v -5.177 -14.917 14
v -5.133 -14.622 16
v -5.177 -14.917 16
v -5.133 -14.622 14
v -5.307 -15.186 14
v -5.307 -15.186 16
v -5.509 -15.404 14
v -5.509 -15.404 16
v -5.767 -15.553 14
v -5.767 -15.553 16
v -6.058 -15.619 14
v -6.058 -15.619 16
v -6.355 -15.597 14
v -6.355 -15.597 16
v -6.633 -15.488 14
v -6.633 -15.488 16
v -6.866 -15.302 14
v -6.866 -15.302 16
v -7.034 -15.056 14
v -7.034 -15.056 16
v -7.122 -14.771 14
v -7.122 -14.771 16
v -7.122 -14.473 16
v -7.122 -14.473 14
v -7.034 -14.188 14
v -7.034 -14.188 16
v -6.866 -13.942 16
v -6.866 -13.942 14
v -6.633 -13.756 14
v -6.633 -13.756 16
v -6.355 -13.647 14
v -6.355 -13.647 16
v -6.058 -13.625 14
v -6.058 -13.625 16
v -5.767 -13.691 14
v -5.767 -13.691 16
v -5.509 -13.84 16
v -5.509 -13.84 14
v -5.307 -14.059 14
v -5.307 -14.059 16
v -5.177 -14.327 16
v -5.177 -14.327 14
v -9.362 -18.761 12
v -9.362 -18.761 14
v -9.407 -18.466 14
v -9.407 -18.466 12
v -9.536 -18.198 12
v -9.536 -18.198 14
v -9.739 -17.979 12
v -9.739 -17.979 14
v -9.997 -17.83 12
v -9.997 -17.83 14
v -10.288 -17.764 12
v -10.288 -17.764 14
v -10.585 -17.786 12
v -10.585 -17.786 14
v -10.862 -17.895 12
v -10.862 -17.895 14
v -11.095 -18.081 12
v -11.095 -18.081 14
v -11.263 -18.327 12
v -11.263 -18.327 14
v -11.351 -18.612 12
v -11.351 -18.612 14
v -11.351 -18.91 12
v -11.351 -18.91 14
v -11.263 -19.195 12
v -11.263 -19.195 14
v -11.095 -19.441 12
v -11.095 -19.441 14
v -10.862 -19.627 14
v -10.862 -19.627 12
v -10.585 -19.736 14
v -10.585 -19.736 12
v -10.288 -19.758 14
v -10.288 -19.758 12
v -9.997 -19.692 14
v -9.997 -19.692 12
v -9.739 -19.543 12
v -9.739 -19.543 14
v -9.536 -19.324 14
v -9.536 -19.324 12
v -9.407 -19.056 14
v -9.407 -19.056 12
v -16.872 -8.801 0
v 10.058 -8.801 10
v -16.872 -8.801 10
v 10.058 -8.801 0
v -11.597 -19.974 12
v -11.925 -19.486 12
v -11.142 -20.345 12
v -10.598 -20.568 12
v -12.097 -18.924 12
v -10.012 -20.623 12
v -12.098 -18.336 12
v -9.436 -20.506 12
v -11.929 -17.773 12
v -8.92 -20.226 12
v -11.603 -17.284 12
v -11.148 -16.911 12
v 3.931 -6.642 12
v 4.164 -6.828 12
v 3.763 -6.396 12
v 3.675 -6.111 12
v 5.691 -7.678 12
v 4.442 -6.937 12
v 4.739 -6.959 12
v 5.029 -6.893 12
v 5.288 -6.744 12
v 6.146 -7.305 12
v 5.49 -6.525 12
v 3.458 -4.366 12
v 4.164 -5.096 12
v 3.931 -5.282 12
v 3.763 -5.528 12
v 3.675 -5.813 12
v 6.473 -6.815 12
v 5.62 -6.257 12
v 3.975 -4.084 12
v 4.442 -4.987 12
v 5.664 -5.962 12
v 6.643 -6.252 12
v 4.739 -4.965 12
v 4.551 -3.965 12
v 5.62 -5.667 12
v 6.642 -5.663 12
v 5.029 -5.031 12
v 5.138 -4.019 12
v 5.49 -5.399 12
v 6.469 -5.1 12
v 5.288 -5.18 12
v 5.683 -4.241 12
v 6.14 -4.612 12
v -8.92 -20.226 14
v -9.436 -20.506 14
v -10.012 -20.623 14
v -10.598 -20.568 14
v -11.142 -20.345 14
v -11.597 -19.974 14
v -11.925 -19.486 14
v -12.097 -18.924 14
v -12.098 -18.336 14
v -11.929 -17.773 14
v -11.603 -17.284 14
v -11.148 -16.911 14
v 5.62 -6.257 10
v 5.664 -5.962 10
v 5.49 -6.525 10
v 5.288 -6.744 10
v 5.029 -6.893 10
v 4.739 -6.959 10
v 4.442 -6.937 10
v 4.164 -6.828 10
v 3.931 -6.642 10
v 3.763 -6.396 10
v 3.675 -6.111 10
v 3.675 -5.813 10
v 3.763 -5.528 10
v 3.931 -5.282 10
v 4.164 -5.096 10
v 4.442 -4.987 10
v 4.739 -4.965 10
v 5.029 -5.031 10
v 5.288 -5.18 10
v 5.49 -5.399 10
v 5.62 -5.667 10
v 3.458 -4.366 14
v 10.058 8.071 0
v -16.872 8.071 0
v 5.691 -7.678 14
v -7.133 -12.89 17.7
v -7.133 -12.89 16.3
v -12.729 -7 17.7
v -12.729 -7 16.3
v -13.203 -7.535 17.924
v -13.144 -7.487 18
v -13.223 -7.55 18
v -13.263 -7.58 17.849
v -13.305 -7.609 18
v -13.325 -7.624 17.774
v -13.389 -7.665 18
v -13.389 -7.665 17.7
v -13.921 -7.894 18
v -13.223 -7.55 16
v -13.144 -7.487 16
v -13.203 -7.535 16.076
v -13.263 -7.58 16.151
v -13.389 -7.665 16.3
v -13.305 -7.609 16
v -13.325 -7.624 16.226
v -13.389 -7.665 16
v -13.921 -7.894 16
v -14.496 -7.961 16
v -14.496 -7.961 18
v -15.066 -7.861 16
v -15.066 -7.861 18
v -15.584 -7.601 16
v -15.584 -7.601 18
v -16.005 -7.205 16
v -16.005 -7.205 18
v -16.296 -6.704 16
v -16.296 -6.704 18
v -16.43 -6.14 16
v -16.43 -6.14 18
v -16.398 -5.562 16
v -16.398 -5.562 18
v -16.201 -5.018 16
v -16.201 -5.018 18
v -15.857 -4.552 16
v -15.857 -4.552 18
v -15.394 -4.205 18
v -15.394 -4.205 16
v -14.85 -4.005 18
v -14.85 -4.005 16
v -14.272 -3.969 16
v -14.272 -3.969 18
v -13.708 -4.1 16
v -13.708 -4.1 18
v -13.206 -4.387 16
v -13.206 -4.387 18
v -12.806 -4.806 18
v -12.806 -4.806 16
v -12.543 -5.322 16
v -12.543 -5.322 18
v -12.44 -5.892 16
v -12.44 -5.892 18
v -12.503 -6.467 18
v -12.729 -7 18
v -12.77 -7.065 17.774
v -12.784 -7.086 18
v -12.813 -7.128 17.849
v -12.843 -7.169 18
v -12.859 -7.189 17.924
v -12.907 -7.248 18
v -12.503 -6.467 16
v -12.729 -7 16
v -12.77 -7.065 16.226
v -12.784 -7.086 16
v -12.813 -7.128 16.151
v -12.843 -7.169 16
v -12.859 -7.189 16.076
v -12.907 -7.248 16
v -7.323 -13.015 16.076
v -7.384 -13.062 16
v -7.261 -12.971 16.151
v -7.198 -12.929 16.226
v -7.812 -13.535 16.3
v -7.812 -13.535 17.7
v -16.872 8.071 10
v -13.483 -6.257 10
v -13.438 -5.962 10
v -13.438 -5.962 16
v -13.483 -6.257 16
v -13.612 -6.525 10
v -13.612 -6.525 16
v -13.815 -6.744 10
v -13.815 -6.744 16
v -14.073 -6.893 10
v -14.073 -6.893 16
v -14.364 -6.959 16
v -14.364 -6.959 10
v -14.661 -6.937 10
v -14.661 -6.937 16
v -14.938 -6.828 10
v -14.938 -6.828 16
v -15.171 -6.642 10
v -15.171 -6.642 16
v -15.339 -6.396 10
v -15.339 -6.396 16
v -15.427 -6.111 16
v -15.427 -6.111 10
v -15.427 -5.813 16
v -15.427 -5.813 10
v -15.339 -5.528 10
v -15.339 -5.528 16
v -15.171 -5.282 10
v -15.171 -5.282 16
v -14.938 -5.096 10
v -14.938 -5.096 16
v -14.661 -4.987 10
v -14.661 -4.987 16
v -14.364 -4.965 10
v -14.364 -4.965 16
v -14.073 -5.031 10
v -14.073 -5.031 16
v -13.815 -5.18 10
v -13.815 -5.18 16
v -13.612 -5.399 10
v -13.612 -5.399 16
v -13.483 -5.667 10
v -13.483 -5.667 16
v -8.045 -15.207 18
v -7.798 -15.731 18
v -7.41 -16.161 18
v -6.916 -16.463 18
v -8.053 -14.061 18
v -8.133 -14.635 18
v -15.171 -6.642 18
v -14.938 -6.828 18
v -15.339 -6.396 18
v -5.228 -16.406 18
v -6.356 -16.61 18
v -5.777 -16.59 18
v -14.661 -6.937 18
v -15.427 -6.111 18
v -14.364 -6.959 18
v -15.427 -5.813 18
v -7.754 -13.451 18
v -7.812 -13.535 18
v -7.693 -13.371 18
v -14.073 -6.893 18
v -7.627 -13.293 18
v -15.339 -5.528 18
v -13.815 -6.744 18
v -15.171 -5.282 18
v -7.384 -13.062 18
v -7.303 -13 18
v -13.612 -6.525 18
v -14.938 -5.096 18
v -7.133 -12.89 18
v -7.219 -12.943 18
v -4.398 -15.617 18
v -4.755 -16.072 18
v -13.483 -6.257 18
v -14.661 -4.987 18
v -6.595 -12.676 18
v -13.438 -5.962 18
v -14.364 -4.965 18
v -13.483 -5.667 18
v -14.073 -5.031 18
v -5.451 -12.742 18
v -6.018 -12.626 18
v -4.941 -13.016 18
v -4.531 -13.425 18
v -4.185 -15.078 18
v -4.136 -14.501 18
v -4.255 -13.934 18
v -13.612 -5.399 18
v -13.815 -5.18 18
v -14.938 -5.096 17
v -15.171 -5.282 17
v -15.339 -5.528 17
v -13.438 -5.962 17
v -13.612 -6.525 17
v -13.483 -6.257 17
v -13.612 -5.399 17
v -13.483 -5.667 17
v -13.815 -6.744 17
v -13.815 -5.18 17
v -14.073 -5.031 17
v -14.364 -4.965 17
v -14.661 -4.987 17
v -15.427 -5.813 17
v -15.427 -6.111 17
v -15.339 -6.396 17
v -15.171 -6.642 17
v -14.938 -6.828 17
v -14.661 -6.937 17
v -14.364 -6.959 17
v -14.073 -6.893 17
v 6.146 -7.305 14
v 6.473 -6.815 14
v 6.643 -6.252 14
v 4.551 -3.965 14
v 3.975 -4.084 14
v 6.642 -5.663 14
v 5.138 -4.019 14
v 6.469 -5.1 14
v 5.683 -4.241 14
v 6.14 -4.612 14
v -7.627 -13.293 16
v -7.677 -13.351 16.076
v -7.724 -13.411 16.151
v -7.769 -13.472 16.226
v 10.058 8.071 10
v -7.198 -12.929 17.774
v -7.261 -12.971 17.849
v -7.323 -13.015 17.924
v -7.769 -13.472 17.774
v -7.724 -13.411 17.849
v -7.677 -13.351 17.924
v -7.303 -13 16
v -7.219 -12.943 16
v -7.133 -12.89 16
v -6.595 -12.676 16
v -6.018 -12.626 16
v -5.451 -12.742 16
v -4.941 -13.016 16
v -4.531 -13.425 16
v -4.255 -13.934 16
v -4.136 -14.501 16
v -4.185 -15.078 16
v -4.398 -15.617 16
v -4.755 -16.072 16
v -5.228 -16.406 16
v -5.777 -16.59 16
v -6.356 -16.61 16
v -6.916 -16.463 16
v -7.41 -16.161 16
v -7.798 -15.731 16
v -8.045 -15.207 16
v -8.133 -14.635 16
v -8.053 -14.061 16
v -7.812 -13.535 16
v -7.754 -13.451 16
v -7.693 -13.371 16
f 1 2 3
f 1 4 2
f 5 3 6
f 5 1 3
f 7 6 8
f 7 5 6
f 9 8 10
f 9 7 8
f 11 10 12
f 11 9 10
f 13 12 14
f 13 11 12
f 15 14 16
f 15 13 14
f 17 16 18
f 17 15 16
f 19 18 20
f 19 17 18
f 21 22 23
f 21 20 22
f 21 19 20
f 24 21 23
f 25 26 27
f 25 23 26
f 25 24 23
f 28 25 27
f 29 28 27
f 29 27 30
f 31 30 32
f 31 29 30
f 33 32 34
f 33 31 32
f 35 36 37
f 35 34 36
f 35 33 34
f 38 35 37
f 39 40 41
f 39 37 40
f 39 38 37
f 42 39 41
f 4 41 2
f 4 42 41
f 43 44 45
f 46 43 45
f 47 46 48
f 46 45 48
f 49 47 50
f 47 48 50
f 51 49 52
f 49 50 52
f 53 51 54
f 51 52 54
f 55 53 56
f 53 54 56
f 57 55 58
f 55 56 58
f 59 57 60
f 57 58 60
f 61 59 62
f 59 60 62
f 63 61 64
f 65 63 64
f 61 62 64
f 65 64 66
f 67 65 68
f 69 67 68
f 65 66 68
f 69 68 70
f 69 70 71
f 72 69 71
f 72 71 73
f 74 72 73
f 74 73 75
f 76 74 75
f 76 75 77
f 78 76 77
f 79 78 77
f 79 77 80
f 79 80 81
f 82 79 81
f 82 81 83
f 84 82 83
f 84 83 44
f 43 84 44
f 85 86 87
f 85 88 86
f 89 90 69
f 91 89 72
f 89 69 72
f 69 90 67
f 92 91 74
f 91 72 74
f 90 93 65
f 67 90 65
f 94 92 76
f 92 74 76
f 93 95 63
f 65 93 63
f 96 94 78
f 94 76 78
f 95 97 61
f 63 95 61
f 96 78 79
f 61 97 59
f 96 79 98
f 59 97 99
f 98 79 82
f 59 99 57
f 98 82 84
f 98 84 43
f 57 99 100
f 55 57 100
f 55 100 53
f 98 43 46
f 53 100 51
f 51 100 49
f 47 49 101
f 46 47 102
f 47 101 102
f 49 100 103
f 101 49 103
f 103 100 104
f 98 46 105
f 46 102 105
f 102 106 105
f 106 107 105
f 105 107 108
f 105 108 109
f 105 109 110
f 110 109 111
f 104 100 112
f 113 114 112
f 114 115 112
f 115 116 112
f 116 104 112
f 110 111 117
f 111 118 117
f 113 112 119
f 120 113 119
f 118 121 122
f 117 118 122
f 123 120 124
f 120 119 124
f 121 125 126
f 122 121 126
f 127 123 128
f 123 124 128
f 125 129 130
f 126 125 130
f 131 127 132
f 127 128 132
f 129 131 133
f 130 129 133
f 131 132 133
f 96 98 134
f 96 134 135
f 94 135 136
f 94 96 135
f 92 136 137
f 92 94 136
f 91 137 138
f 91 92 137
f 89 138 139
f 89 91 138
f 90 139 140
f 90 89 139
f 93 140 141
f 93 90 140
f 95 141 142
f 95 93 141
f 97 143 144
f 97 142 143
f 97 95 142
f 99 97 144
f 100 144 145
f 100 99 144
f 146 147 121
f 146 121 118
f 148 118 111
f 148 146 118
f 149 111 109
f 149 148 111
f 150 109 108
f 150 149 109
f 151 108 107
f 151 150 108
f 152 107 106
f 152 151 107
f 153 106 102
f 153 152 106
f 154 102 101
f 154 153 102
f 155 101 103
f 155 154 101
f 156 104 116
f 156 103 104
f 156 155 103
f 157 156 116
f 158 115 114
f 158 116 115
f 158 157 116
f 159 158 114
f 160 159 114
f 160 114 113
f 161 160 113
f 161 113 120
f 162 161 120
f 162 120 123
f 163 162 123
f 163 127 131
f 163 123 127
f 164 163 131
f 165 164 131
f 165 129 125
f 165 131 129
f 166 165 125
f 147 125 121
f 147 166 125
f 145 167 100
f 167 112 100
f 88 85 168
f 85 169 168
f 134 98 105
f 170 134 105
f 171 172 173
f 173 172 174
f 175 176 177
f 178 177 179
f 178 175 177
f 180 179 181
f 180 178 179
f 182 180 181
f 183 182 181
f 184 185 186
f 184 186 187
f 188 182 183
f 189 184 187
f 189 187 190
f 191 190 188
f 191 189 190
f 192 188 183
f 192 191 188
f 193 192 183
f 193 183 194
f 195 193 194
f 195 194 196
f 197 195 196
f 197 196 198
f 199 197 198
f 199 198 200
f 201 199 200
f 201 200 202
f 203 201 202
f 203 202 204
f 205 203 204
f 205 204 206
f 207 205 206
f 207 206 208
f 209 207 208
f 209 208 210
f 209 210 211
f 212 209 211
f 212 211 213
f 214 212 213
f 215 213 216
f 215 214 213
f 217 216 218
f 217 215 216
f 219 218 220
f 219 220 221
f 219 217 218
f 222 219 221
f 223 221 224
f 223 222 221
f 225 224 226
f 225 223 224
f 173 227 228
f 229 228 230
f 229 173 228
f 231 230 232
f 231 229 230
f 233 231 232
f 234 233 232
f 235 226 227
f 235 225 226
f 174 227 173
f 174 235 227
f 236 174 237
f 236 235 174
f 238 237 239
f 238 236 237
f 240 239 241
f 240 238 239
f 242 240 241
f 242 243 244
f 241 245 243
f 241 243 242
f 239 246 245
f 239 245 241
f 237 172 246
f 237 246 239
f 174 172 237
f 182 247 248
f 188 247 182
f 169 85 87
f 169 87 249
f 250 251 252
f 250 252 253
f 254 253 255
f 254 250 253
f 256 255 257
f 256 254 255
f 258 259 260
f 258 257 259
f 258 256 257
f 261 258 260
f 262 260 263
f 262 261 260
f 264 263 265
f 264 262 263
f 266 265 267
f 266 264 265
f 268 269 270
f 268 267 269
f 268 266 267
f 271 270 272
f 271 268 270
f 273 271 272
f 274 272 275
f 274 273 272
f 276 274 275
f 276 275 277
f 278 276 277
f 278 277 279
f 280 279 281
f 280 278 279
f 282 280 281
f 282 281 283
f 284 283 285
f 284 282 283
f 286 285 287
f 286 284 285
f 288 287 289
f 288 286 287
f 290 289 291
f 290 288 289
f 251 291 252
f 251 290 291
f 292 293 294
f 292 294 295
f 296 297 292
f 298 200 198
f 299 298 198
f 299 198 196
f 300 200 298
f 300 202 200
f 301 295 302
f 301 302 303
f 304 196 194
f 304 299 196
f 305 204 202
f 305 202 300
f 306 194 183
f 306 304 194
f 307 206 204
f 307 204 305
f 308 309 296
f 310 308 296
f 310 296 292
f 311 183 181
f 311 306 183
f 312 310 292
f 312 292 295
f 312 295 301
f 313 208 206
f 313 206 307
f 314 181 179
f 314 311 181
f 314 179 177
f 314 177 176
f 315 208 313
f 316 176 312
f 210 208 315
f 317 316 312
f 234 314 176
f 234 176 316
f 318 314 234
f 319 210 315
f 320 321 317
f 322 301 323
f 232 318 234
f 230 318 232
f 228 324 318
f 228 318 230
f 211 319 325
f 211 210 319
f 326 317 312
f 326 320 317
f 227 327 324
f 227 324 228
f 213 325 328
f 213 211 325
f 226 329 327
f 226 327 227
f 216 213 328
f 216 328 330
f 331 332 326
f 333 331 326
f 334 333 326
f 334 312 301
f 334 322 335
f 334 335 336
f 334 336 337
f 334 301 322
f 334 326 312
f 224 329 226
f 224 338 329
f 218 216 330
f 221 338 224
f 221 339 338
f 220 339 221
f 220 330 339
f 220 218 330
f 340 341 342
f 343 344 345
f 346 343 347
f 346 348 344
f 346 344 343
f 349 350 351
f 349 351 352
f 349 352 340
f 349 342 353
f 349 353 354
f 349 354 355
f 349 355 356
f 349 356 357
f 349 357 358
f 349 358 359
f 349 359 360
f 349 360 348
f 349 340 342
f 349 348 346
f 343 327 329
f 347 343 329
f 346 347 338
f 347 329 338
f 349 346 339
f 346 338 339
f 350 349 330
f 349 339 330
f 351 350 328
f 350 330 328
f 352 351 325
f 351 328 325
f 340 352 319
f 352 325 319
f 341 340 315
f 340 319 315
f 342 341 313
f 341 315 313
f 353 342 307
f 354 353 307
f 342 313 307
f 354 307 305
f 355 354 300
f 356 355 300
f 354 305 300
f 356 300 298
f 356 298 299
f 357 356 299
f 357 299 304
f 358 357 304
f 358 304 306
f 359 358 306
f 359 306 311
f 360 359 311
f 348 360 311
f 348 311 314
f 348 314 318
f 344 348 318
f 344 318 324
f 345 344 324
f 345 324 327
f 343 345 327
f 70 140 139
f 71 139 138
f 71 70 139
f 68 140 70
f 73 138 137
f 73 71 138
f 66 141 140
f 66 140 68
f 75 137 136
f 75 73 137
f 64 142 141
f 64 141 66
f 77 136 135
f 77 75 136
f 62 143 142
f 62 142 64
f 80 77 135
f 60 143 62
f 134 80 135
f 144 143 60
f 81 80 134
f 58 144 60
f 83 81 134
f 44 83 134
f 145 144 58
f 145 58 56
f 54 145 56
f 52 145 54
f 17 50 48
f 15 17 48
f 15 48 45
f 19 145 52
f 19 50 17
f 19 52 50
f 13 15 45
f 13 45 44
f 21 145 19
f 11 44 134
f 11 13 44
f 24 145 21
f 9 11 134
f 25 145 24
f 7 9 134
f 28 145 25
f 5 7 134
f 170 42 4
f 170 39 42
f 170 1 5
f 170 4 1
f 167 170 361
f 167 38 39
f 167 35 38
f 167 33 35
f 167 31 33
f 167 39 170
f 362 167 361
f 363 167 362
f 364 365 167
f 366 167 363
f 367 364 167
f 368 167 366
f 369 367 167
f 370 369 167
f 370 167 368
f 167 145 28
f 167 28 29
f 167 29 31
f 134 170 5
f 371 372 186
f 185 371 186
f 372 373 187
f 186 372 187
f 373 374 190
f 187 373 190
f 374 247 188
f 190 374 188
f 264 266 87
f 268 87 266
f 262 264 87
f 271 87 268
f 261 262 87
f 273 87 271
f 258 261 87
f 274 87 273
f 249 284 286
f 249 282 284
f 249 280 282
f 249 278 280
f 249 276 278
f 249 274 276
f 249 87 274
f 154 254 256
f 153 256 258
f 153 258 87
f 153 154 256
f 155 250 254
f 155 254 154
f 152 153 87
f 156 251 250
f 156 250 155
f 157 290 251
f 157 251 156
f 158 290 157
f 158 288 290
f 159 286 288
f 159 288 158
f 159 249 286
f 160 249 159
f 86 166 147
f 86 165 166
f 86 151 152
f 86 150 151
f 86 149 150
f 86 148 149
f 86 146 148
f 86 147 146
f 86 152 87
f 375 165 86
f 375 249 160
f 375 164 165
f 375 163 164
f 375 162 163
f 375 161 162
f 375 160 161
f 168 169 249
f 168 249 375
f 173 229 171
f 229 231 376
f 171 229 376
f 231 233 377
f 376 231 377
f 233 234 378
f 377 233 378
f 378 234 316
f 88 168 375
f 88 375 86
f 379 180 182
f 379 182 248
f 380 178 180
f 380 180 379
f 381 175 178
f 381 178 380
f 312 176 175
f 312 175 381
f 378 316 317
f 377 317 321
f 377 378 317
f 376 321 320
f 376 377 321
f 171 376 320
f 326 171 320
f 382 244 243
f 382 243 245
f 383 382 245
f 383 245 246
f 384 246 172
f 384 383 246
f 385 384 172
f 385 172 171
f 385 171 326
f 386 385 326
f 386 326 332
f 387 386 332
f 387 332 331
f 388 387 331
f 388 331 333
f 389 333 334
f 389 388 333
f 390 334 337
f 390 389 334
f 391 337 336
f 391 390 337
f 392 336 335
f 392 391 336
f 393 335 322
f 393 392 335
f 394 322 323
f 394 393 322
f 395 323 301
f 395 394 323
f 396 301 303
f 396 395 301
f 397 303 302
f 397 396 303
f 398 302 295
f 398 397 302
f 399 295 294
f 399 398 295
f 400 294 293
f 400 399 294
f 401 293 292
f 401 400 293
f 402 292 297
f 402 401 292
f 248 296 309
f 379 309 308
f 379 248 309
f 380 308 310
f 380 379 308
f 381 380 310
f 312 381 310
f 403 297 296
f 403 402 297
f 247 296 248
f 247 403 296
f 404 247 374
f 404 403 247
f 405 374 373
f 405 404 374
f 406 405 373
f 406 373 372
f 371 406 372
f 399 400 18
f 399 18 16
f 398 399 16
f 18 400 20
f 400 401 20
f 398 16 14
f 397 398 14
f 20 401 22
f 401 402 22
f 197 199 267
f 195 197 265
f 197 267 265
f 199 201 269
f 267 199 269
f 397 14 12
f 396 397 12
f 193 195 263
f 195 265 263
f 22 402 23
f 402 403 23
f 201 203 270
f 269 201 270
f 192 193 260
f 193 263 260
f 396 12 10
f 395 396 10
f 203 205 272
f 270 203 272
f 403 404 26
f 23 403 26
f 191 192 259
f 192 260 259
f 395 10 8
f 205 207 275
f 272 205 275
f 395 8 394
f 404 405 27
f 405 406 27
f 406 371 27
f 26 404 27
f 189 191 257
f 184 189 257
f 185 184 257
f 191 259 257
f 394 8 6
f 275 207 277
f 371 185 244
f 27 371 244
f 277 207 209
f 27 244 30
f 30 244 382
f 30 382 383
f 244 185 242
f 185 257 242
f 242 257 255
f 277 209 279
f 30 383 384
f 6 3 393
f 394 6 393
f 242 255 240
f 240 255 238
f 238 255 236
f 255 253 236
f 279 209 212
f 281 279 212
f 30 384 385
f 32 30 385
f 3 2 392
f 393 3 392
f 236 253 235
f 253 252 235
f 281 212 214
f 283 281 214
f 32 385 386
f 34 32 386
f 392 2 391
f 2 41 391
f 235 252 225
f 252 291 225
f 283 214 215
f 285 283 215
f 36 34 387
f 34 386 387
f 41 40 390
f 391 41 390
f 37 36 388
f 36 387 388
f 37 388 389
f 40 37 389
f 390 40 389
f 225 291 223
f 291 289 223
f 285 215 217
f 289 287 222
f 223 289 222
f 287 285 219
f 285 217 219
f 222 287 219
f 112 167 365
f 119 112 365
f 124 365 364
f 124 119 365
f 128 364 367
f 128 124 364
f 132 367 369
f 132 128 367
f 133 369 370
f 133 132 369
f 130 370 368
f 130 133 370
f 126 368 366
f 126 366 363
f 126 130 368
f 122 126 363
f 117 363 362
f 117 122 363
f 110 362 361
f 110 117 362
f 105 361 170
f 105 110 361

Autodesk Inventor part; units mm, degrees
ref_plane "YZ Plane" through (0, 0, 0) normal (1, 0, 0) x (0, 1, 0)
ref_plane "XZ Plane" through (0, 0, 0) normal (0, 1, 0) x (-1, 0, 0)
ref_plane "XY Plane" through (0, 0, 0) normal (0, 0, 1) x (1, 0, 0)
sketch "Эскиз1" plane through (0, 0, 0) normal (0, 0, 1) x (1, 0, 0)
  line L0 (10.0582, -8.8009) -> (-16.8718, -8.8009)
  line L1 (-16.8718, -8.8009) -> (-16.8718, 8.0709)
  line L2 (-16.8718, 8.0709) -> (10.0582, 8.0709)
  line L3 (10.0582, 8.0709) -> (10.0582, -8.8009)
  point P0 (0, 0)
extrude "Выдавливание1" add sketch "Эскиз1" along normal blind 10
sketch "Эскиз2" plane through (0, 0, 10) normal (0, 0, 1) x (1, 0, 0)
  circle A0 centre (4.6641, -5.9619) radius 1
  circle A1 centre (-14.4383, -5.9619) radius 1
  point P0 (0, 0)
  dimension "d2" = 2
  dimension "d3" = 2
extrude "Выдавливание2" add sketch "Эскиз2" along normal blind 2
sketch "Эскиз3" plane through (4.6641, -5.9619, 12) normal (0, 0, 1) x (1, 0, 0)
  circle A0 centre (0, 0) radius 1 projected
  circle A1 centre (0, 0) radius 2
  circle A2 centre (-14.7836, -12.664) radius 2
  line L0 (-1.2061, 1.5954) -> (-15.8126, -10.949)
  line L1 (-13.5836, -14.264) -> (1.0265, -1.7165)
  point P0 (-4.6641, 5.9619)
  dimension "d6" = 4
  dimension "d7" = 4
extrude "Выдавливание3" add sketch "Эскиз3" along normal blind 2
sketch "Эскиз4" plane through (-14.4383, -5.9619, 12) normal (0, 0, 1) x (1, 0, 0)
  circle A0 centre (0, 0) radius 1
  point P0 (14.4383, 5.9619)
extrude "Выдавливание4" add sketch "Эскиз4" along normal blind 4
sketch "Эскиз5" plane through (4.6641, -5.9619, 14) normal (0, 0, 1) x (1, 0, 0)
  circle A0 centre (-10.7969, -8.6603) radius 1
  point P0 (-4.6641, 5.9619)
  dimension "d12" = 2
extrude "Выдавливание5" add sketch "Эскиз5" along normal blind 2
sketch "Эскиз6" plane through (4.6641, -5.9619, 14) normal (0, 0, 1) x (1, 0, 0)
  circle A0 centre (-15.0265, -12.7992) radius 1
  point P0 (-4.6641, 5.9619)
  dimension "d15" = 2
extrude "Выдавливание6" cut sketch "Эскиз6" against normal blind 10
sketch "Эскиз7" plane through (-14.4383, -5.9619, 16) normal (0, 0, 1) x (1, 0, 0)
  circle A0 centre (0, 0) radius 2
  circle A1 centre (8.3055, -8.6603) radius 1 projected
  circle A2 centre (8.3055, -8.6603) radius 2
  line L0 (7.3055, -6.9282) -> (1.7093, -1.0384)
  line L1 (6.6268, -7.5731) -> (1.0492, -1.7027)
  point P0 (14.4383, 5.9619)
  dimension "d18" = 4
  dimension "d19" = 4
extrude "Выдавливание7" add sketch "Эскиз7" along normal blind 2 contours A0 | A0 L0 A2 L1 | A2 | A1
sketch "Эскиз8" plane through (-14.4383, -5.9619, 18) normal (0, 0, 1) x (1, 0, 0)
  circle A0 centre (0, 0) radius 1
  point P0 (14.4383, 5.9619)
extrude "Выдавливание8" cut sketch "Эскиз8" against normal blind 1
chamfer "Фаска1" distance 0.3 angle 45 4 edges at (-9.9309, -9.9452, 18) (-9.9309, -9.9452, 16) (-10.6004, -10.5998, 16) (-10.6004, -10.5998, 18)
